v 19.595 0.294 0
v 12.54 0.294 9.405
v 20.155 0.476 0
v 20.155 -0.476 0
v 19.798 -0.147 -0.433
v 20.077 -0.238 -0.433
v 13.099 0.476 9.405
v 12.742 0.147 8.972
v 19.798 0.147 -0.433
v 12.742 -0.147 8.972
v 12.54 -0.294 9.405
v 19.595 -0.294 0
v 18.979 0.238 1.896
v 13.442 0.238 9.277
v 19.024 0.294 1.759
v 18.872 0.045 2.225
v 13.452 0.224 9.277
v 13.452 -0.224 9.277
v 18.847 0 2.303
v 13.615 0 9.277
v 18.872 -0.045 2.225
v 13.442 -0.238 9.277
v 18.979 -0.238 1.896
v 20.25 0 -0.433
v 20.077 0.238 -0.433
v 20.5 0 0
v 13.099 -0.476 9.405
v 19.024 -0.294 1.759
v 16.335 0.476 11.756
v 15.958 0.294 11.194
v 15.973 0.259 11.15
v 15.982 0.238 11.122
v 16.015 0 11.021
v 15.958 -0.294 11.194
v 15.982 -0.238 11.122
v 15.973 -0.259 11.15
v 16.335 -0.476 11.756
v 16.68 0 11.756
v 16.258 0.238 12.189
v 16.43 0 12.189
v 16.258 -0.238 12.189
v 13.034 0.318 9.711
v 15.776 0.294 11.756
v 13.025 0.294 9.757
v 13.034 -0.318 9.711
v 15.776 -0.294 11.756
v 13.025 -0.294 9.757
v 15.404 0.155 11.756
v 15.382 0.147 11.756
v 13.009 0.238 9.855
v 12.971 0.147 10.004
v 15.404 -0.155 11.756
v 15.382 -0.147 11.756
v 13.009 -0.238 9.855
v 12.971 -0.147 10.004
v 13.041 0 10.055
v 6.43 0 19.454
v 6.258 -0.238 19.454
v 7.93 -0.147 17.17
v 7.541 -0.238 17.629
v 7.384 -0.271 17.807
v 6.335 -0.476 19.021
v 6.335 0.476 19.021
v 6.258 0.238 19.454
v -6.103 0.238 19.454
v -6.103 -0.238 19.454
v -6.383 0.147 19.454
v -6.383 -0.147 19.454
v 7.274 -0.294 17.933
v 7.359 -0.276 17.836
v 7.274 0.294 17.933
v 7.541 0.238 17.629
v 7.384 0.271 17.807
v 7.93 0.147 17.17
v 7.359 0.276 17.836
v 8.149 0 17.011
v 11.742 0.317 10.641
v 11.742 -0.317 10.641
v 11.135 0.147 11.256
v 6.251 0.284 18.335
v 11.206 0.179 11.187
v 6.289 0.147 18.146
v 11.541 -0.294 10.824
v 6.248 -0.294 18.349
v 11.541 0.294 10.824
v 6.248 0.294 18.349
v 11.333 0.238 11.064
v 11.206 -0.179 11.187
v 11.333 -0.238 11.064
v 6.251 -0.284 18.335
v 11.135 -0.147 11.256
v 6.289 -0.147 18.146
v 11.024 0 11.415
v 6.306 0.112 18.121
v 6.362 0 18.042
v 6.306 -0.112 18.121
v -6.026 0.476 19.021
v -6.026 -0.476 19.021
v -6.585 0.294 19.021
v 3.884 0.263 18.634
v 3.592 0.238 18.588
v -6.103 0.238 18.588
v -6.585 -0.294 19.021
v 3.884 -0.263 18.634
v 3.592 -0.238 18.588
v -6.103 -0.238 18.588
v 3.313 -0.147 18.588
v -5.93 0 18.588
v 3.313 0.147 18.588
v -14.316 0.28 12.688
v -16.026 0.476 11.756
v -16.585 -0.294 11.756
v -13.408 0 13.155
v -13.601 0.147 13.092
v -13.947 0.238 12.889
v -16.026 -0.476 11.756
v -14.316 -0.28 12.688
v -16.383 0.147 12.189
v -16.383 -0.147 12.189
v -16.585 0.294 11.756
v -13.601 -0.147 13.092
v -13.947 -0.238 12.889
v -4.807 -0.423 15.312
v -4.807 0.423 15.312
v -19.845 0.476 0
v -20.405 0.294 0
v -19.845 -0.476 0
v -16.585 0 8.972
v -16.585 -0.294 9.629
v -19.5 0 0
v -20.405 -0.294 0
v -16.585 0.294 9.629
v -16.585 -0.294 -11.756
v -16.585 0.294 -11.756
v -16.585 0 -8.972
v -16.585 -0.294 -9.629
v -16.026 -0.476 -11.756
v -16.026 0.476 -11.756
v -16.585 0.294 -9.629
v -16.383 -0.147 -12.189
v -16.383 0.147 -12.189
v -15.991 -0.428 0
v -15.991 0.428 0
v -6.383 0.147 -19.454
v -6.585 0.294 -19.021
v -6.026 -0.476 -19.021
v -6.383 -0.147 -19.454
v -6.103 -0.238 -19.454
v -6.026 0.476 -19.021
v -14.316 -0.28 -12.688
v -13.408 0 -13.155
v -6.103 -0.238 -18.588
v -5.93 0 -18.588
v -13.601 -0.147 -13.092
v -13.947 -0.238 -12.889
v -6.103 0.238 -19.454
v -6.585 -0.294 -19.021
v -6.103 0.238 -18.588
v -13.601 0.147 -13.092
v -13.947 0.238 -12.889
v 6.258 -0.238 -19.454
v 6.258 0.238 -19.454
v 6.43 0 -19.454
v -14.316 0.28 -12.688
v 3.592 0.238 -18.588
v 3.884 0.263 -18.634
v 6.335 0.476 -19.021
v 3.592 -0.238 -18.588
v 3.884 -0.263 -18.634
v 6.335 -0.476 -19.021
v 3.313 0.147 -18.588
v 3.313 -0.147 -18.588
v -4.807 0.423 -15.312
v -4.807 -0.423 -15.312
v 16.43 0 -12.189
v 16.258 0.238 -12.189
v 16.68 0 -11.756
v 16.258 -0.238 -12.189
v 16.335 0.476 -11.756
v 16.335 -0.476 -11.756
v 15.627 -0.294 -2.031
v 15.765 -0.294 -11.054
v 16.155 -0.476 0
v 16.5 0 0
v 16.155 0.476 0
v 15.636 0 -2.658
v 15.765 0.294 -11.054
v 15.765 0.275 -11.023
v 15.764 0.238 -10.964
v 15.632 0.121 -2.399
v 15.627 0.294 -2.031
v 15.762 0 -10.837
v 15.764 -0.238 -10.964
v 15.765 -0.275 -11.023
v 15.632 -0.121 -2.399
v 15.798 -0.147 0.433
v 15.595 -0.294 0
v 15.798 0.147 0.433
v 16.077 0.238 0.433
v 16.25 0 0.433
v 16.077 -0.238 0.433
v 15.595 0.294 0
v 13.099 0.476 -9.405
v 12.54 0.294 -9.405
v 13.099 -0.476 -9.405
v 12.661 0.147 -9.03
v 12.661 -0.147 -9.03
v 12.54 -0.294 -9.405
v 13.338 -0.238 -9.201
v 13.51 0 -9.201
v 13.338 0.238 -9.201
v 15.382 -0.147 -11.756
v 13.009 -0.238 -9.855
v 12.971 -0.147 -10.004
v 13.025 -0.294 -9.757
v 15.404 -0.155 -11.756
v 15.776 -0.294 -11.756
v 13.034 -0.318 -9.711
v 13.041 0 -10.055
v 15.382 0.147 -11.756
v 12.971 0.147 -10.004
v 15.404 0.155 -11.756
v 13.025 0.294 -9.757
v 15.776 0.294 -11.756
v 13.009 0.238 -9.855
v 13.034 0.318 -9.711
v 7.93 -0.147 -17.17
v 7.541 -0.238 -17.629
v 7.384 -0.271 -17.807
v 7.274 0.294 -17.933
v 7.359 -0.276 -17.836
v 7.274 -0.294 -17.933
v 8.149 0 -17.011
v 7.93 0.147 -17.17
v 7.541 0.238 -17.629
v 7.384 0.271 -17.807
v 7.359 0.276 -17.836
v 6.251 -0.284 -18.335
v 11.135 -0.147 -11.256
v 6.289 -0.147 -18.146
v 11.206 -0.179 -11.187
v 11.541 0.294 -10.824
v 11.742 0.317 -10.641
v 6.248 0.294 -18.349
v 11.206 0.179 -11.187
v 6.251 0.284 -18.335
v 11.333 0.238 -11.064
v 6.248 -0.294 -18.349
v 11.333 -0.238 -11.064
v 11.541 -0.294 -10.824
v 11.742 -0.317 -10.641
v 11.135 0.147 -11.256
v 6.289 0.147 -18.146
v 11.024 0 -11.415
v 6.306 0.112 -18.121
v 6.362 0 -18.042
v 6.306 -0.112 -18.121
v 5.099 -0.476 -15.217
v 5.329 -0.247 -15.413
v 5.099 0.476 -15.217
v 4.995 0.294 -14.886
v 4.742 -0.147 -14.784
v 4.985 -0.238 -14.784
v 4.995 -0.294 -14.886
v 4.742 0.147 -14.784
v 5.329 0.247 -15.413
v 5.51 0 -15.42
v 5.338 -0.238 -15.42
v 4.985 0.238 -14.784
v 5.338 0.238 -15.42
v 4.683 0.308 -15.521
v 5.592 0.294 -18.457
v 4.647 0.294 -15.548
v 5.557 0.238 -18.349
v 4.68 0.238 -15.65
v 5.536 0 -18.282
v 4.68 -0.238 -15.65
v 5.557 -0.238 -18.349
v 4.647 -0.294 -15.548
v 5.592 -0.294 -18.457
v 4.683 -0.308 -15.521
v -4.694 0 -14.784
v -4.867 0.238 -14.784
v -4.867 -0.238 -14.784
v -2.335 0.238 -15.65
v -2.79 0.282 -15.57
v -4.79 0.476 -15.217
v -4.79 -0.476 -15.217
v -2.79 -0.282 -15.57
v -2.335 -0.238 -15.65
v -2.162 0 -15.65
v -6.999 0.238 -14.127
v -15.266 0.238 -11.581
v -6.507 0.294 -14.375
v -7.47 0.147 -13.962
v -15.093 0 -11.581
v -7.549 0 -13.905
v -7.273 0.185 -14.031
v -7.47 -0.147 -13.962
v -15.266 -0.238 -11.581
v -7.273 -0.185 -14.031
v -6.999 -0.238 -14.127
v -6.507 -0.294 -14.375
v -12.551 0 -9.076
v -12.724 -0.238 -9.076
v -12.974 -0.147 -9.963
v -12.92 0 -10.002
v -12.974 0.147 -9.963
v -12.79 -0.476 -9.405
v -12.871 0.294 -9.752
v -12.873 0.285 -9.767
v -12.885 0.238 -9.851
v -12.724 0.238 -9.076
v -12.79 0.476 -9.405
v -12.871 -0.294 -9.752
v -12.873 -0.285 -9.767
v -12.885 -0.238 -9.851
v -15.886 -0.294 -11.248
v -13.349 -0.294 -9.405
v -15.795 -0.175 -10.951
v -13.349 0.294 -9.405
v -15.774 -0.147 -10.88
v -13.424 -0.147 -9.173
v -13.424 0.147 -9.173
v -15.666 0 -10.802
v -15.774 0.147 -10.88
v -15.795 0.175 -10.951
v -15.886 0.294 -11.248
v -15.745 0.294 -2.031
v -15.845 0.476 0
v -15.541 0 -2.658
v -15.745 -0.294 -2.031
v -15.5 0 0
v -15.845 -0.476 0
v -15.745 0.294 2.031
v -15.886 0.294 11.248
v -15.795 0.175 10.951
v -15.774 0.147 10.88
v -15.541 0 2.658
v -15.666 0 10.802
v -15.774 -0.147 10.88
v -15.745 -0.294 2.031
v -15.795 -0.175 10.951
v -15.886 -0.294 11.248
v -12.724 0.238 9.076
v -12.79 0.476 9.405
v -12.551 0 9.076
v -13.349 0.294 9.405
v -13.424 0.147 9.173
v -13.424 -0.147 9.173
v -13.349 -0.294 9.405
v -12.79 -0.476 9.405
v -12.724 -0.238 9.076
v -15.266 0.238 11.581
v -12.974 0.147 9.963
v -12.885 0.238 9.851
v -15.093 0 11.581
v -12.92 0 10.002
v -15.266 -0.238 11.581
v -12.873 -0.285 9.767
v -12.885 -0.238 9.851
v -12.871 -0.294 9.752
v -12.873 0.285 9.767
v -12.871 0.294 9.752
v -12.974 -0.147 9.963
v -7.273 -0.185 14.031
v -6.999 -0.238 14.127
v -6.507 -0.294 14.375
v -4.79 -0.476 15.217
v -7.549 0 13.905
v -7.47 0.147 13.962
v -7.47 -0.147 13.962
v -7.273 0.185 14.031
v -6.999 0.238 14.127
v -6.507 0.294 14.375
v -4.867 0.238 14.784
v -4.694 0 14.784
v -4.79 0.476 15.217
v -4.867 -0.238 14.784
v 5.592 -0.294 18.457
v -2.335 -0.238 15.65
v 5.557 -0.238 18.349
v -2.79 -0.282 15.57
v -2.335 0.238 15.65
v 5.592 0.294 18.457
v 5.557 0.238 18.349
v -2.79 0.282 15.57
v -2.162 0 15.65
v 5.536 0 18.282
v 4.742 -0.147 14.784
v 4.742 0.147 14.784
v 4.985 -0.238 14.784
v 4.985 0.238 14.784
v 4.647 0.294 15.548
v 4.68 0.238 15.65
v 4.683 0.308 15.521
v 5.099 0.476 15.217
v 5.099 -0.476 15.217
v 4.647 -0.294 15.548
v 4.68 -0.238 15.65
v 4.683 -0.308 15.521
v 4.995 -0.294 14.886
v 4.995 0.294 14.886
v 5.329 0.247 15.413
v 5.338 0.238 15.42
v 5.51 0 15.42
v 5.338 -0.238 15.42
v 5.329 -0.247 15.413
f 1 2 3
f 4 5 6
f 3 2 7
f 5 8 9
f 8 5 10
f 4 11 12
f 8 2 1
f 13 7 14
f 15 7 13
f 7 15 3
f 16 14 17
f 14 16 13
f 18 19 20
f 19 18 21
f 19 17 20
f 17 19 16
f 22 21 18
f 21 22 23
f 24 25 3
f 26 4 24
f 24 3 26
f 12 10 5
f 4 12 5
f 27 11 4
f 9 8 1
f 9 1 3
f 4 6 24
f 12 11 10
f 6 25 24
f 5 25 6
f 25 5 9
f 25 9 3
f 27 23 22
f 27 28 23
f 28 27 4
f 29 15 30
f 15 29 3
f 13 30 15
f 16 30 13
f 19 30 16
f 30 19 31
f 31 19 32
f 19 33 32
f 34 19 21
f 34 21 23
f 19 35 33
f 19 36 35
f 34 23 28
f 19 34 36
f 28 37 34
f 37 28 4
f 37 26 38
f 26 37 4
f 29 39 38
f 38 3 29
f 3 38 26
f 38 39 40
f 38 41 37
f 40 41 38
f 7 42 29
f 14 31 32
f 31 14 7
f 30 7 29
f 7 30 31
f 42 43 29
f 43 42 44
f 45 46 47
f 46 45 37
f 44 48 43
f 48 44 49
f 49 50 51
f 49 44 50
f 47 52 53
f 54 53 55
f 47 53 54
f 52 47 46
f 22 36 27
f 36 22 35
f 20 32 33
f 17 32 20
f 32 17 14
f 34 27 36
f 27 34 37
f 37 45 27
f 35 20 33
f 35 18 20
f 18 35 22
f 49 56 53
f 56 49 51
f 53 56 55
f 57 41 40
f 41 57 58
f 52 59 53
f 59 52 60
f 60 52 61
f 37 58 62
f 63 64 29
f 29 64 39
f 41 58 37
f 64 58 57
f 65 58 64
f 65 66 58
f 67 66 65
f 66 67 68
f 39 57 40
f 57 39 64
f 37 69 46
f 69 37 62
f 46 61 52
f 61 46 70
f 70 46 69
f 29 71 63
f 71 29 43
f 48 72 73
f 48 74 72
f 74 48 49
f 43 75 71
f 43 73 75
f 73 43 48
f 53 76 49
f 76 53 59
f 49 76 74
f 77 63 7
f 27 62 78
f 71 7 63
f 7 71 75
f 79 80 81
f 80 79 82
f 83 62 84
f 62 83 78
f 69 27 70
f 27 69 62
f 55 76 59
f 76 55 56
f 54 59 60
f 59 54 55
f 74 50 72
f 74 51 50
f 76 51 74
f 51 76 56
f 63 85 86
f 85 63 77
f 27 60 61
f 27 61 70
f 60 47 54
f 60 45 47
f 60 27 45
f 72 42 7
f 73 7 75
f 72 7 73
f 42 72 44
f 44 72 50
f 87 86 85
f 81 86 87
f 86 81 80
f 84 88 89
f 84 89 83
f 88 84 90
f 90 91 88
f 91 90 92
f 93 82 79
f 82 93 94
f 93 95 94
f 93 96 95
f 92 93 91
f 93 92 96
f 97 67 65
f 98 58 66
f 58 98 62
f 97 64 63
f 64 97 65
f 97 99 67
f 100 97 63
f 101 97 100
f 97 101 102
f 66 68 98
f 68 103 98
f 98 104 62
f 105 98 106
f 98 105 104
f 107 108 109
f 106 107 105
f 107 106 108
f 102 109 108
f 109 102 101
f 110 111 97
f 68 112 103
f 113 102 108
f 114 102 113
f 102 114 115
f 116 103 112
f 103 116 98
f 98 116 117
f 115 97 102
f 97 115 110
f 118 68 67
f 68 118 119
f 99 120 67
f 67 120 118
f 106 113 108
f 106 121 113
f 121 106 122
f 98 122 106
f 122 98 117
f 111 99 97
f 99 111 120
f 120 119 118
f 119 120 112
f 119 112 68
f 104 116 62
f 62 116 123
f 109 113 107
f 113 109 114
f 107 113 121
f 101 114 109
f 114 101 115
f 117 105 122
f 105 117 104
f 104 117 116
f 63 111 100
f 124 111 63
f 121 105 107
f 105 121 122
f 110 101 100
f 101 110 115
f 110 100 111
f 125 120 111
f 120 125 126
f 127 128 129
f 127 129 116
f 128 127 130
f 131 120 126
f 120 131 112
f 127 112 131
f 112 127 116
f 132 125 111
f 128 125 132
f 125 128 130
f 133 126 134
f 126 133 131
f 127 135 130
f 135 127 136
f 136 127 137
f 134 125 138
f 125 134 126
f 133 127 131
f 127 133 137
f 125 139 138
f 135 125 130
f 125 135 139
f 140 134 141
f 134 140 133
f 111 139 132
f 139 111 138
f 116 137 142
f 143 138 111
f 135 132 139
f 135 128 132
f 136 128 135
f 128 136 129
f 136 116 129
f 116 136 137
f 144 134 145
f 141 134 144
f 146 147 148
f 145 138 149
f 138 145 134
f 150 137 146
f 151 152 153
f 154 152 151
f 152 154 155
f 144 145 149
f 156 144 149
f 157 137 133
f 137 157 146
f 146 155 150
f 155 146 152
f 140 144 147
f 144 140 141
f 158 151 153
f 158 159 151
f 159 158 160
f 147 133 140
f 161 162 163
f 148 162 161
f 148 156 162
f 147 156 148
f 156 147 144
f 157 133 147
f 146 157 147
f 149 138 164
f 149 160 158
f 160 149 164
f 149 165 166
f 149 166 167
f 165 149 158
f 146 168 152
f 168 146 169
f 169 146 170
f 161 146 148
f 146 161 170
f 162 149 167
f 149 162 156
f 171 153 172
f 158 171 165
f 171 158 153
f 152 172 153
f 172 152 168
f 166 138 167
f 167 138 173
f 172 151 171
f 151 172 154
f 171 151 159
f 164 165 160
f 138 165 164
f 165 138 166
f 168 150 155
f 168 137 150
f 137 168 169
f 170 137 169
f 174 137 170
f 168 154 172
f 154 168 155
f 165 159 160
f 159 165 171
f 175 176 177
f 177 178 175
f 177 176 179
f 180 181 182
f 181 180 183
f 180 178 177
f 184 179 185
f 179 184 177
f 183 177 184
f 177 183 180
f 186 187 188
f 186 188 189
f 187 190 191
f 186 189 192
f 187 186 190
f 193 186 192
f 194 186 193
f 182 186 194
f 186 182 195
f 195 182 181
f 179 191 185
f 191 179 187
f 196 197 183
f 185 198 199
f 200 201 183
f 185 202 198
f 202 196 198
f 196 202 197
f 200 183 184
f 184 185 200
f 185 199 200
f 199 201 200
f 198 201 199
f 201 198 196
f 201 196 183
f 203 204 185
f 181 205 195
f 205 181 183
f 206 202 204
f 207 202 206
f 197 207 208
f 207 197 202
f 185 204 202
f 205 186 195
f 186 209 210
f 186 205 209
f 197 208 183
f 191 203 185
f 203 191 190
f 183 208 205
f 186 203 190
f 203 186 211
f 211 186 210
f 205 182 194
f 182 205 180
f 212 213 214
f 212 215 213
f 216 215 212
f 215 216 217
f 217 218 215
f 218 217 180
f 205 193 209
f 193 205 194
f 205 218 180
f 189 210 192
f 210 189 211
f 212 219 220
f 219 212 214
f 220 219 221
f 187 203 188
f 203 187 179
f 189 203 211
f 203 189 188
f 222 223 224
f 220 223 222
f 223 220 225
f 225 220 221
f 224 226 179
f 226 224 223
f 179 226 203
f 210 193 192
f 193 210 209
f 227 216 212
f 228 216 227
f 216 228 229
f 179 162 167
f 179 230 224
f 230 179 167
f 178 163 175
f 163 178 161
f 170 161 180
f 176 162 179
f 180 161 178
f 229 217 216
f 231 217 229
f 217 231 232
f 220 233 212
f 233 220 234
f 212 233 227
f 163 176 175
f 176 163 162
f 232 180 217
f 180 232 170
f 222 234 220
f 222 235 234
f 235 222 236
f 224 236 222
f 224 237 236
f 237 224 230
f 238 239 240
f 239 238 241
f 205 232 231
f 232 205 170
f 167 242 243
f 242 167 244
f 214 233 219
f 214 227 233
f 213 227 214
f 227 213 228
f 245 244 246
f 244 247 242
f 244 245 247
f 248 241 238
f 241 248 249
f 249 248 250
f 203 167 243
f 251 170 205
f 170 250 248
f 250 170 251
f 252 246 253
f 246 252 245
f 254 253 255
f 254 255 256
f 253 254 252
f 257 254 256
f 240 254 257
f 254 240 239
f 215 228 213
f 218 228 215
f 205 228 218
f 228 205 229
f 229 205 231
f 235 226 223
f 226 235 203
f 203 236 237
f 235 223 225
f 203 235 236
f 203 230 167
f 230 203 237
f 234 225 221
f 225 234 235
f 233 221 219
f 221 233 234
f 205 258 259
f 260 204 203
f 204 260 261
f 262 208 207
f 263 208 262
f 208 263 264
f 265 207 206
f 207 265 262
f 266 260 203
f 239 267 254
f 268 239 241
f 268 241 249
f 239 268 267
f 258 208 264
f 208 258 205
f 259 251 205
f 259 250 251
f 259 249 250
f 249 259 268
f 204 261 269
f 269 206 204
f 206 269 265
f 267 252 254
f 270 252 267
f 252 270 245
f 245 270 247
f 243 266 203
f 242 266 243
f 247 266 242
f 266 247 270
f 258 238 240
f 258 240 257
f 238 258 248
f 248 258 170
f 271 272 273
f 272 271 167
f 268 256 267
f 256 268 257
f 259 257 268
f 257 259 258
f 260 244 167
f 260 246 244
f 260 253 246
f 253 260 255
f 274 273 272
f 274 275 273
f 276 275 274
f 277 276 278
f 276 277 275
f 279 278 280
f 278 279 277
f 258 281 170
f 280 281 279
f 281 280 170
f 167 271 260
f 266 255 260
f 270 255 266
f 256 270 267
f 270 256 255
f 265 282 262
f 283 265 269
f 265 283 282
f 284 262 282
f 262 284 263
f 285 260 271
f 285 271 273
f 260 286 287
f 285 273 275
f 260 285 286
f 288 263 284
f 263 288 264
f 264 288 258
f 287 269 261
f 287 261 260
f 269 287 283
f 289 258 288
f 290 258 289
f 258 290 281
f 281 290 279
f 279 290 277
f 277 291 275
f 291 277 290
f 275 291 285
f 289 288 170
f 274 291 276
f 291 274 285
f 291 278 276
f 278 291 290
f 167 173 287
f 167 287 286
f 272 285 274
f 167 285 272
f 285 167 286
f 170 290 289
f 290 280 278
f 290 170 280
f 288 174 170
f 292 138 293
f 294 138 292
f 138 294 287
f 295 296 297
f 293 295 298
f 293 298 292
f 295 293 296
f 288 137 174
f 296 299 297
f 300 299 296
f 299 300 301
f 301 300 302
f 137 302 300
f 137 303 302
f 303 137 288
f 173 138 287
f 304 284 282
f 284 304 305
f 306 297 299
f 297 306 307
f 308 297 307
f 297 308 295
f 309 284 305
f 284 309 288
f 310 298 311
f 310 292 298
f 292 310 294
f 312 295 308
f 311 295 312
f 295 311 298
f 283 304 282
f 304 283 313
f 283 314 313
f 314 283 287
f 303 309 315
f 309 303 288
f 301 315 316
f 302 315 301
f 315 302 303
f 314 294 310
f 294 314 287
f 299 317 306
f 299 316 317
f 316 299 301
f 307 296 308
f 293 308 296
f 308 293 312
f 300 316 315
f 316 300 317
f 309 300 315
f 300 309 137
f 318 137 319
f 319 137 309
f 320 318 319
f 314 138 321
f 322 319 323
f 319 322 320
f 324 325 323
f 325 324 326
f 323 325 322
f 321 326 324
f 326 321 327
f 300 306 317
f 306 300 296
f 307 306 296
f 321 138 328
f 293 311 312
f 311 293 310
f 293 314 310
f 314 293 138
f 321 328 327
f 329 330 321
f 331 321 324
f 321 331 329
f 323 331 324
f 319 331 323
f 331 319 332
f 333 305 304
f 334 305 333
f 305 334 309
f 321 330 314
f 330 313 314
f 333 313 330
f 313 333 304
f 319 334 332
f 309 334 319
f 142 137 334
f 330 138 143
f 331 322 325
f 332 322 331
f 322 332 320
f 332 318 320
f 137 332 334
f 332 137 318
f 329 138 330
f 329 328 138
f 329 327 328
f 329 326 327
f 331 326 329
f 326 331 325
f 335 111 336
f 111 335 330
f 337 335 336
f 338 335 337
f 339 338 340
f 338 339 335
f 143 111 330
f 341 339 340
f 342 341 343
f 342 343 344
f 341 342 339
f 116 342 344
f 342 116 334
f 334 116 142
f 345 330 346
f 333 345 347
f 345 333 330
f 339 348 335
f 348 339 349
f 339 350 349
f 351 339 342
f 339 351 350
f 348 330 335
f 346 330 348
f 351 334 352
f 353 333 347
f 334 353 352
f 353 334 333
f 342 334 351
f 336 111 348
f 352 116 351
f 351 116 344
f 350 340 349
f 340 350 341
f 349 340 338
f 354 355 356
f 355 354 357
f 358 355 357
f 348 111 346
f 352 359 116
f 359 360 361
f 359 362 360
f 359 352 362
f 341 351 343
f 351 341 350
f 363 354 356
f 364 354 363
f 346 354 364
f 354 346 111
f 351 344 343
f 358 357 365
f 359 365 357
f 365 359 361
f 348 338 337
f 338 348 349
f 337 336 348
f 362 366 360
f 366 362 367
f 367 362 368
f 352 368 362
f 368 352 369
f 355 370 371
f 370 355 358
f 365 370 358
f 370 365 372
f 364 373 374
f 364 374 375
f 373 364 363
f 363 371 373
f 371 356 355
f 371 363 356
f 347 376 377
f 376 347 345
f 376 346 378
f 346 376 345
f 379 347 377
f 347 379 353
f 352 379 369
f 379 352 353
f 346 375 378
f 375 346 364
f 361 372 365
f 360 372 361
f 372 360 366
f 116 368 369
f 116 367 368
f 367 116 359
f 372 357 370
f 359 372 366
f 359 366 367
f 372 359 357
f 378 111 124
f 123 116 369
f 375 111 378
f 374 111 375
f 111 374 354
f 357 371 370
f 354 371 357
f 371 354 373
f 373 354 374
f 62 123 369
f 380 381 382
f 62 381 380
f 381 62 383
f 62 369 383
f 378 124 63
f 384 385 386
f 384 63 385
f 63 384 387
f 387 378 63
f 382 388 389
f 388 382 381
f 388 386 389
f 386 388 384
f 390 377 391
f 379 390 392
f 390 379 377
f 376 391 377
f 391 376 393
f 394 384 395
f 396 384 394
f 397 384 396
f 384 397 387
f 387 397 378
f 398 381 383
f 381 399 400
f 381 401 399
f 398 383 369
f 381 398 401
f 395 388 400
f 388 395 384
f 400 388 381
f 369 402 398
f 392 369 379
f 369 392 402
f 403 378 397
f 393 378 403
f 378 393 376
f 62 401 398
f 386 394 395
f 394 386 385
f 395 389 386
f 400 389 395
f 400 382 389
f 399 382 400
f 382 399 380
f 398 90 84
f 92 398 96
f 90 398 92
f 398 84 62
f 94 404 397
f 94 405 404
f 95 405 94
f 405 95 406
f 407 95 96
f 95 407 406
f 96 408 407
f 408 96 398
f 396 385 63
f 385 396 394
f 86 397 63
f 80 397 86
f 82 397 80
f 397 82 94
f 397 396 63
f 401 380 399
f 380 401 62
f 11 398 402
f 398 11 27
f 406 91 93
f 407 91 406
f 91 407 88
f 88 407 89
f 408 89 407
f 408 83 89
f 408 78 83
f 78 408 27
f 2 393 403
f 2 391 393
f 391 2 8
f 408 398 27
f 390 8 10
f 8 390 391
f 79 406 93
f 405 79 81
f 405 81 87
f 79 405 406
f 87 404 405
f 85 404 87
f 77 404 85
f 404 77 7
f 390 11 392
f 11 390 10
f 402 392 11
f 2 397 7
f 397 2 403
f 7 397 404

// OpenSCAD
function _furthestAwayFromPoint(points,poly,z,bestD=-1,bestPos=0,pos=0) = 
    len(poly) <= pos ? bestPos :
    norm(points[poly[pos]]-z) > bestD ? _furthestAwayFromPoint(points,poly,z,bestD=norm(points[poly[pos]]-z),bestPos=pos,pos=pos+1) :
    _furthestAwayFromPoint(points,poly,z,bestD=bestD,bestPos=bestPos,pos=pos+1);
    
function _triangleArea(a,b,c) = norm(cross(b-a,c-a))/2;
    
function _furthestAwayFromLine(points,poly,z1,z2,bestArea=-1,bestPos=0,pos=0) = 
    len(poly) <= pos ? bestPos :
    _triangleArea(z1,z2,points[poly[pos]]) > bestArea ? _furthestAwayFromLine(points,poly,z1,z2,bestArea=_triangleArea(z1,z2,points[poly[pos]]),bestPos=pos,pos=pos+1) :
    _furthestAwayFromLine(points,poly,z1,z2,bestArea=bestArea,bestPos=bestPos,pos=pos+1);
    
function normalize(v) = v/norm(v);

function _winding(points,poly,sum=0,pos=0) =
    pos >= len(poly) ? sum :
    _winding(points,poly,sum=sum+(points[poly[(pos+1)%len(poly)]][0]-points[poly[pos]][0])*(points[poly[(pos+1)%len(poly)]][1]+points[poly[pos]][1]),pos=pos+1);

function _isCCW(points,poly) =
_winding(points,poly) < 0;

function identifyPlane(points,poly) = let(i=_furthestAwayFromPoint(points,poly,points[poly[0]]),
           j=_furthestAwayFromLine(points,poly,points[poly[0]],points[poly[i]]),
           normal = cross(points[poly[i]]-points[poly[0]],points[poly[j]]-points[poly[0]]),
           a = points[poly[i]]-points[poly[0]],
           b = cross(normal,a),
           cs = [points[poly[0]],normalize(a),normalize(b),normalize(normal)])
           _isCCW(projectPoints(cs,points),poly) ? cs : [cs[0],-cs[1],cs[2],cs[3]];
                      
function projectPoint(coordsys,p) = let(v=p-coordsys[0],
           vp=v-(v*coordsys[3])*coordsys[3]) [vp*coordsys[1],vp*coordsys[2]];
           
function projectPoints(coordsys,p) = [for(v=p) projectPoint(coordsys,v)];
    
function triangulate(points,poly=undef) = 
    let(poly = poly==undef ? [for(i=[0:1:len(points)-1]) i] : poly)
    len(points[poly[0]]) == 2 ? triangulate2D(points,poly) : triangulate2D(projectPoints(identifyPlane(points,poly),points),poly);

function mod(a,b) = let(m=a%b) m < 0 ? m+b : m;

function _delPoint(v,i) = [for(j=[0:1:len(v)-1]) if(i!=j) v[j]];
    
function _isCCWTriangle(a,b,c) = cross(b-a,c-a) >= 0;
    
function _crosses(points,poly,a,b,ignore,pos=0) =     
    pos >= len(poly) ? false :
    ignore != pos && ignore !=  mod(pos+1,len(poly)) && _isCross(points[poly[pos]],points[poly[mod(pos+1,len(poly))]],a,b) ? true : _crosses(points,poly,a,b,pos=pos+1);

function _isReflex(points,poly,i) = 
    let(n=len(poly),
        a=points[poly[mod(i-1,n)]],
        b=points[poly[i]],
        c=points[poly[mod(i+1,n)]]) cross(b-a,c-b) < 0;
                
function _checkEar2(points,poly,a,b,c,j) = 
   let(p=points[poly[mod(j,len(poly))]],
       c1=cross(p-a,b-a))
       ! ( c1*cross(p-b,c-b) >0 && c1*cross(p-c,a-c)>0 );
                
function _checkEar(points,poly,a,b,c,i,j) =
    mod(j,len(poly))==mod(i-1,len(poly)) ? true :
    _isReflex(points,poly,mod(j,len(poly))) && ! _checkEar2(points,poly,a,b,c,j) ? false :
    _checkEar(points,poly,a,b,c,i,j+1);

function _isEar(points,poly,i) = 
    _isReflex(points,poly,i) ? false :
    let(n=len(poly),
        a=points[poly[mod(i-1,n)]],
        b=points[poly[i]],
        c=points[poly[mod(i+1,n)]],
        j=i+2)
        _checkEar(points,poly,a,b,c,i,i+2);        

function _findEar(points,poly,pos=0) =
    assert(pos<len(poly))
    _isEar(points,poly,pos) ? pos : _findEar(points,poly,pos=pos+1);

function _cutEar(points,poly) = 
    let(n=len(poly),
        i=_findEar(points,poly))
        _delPoint(poly,i);
            
function _getEar(points,poly) = 
    let(n=len(poly),
        i=_findEar(points,poly))
        [poly[mod(i-1,n)],poly[i],poly[mod(i+1,n)]];

function triangulate2D(points,poly,soFar=[]) = 
    len(poly) == 3 ? concat(soFar,[poly]) :
    triangulate2D(points,_cutEar(points,poly),soFar=concat(soFar,[_getEar(points,poly)]));
    
module showTriangulation(points,tt) 
{
    for(t=tt) {
        for(i=[0:2]) {
            hull() {
                translate(points[t[i]]) sphere(d=1);
                translate(points[t[(i+1)%3]]) sphere(d=1);
            }
        }
    }
}

//<skip>
function testPoly2(n) = concat([for(i=[0:n-1]) 20*[cos(i*360/n),0*rands(0,.3,1)[0],sin(i*360/n)]],[for(i=[0:n-1]) 20*[0.8*cos(i*360/n),0*rands(0,.3,1)[0],-0.8*sin(i*360/n)]]);

testPoints=testPoly2(10);
showTriangulation(testPoints,triangulate(testPoints));
//</skip>
